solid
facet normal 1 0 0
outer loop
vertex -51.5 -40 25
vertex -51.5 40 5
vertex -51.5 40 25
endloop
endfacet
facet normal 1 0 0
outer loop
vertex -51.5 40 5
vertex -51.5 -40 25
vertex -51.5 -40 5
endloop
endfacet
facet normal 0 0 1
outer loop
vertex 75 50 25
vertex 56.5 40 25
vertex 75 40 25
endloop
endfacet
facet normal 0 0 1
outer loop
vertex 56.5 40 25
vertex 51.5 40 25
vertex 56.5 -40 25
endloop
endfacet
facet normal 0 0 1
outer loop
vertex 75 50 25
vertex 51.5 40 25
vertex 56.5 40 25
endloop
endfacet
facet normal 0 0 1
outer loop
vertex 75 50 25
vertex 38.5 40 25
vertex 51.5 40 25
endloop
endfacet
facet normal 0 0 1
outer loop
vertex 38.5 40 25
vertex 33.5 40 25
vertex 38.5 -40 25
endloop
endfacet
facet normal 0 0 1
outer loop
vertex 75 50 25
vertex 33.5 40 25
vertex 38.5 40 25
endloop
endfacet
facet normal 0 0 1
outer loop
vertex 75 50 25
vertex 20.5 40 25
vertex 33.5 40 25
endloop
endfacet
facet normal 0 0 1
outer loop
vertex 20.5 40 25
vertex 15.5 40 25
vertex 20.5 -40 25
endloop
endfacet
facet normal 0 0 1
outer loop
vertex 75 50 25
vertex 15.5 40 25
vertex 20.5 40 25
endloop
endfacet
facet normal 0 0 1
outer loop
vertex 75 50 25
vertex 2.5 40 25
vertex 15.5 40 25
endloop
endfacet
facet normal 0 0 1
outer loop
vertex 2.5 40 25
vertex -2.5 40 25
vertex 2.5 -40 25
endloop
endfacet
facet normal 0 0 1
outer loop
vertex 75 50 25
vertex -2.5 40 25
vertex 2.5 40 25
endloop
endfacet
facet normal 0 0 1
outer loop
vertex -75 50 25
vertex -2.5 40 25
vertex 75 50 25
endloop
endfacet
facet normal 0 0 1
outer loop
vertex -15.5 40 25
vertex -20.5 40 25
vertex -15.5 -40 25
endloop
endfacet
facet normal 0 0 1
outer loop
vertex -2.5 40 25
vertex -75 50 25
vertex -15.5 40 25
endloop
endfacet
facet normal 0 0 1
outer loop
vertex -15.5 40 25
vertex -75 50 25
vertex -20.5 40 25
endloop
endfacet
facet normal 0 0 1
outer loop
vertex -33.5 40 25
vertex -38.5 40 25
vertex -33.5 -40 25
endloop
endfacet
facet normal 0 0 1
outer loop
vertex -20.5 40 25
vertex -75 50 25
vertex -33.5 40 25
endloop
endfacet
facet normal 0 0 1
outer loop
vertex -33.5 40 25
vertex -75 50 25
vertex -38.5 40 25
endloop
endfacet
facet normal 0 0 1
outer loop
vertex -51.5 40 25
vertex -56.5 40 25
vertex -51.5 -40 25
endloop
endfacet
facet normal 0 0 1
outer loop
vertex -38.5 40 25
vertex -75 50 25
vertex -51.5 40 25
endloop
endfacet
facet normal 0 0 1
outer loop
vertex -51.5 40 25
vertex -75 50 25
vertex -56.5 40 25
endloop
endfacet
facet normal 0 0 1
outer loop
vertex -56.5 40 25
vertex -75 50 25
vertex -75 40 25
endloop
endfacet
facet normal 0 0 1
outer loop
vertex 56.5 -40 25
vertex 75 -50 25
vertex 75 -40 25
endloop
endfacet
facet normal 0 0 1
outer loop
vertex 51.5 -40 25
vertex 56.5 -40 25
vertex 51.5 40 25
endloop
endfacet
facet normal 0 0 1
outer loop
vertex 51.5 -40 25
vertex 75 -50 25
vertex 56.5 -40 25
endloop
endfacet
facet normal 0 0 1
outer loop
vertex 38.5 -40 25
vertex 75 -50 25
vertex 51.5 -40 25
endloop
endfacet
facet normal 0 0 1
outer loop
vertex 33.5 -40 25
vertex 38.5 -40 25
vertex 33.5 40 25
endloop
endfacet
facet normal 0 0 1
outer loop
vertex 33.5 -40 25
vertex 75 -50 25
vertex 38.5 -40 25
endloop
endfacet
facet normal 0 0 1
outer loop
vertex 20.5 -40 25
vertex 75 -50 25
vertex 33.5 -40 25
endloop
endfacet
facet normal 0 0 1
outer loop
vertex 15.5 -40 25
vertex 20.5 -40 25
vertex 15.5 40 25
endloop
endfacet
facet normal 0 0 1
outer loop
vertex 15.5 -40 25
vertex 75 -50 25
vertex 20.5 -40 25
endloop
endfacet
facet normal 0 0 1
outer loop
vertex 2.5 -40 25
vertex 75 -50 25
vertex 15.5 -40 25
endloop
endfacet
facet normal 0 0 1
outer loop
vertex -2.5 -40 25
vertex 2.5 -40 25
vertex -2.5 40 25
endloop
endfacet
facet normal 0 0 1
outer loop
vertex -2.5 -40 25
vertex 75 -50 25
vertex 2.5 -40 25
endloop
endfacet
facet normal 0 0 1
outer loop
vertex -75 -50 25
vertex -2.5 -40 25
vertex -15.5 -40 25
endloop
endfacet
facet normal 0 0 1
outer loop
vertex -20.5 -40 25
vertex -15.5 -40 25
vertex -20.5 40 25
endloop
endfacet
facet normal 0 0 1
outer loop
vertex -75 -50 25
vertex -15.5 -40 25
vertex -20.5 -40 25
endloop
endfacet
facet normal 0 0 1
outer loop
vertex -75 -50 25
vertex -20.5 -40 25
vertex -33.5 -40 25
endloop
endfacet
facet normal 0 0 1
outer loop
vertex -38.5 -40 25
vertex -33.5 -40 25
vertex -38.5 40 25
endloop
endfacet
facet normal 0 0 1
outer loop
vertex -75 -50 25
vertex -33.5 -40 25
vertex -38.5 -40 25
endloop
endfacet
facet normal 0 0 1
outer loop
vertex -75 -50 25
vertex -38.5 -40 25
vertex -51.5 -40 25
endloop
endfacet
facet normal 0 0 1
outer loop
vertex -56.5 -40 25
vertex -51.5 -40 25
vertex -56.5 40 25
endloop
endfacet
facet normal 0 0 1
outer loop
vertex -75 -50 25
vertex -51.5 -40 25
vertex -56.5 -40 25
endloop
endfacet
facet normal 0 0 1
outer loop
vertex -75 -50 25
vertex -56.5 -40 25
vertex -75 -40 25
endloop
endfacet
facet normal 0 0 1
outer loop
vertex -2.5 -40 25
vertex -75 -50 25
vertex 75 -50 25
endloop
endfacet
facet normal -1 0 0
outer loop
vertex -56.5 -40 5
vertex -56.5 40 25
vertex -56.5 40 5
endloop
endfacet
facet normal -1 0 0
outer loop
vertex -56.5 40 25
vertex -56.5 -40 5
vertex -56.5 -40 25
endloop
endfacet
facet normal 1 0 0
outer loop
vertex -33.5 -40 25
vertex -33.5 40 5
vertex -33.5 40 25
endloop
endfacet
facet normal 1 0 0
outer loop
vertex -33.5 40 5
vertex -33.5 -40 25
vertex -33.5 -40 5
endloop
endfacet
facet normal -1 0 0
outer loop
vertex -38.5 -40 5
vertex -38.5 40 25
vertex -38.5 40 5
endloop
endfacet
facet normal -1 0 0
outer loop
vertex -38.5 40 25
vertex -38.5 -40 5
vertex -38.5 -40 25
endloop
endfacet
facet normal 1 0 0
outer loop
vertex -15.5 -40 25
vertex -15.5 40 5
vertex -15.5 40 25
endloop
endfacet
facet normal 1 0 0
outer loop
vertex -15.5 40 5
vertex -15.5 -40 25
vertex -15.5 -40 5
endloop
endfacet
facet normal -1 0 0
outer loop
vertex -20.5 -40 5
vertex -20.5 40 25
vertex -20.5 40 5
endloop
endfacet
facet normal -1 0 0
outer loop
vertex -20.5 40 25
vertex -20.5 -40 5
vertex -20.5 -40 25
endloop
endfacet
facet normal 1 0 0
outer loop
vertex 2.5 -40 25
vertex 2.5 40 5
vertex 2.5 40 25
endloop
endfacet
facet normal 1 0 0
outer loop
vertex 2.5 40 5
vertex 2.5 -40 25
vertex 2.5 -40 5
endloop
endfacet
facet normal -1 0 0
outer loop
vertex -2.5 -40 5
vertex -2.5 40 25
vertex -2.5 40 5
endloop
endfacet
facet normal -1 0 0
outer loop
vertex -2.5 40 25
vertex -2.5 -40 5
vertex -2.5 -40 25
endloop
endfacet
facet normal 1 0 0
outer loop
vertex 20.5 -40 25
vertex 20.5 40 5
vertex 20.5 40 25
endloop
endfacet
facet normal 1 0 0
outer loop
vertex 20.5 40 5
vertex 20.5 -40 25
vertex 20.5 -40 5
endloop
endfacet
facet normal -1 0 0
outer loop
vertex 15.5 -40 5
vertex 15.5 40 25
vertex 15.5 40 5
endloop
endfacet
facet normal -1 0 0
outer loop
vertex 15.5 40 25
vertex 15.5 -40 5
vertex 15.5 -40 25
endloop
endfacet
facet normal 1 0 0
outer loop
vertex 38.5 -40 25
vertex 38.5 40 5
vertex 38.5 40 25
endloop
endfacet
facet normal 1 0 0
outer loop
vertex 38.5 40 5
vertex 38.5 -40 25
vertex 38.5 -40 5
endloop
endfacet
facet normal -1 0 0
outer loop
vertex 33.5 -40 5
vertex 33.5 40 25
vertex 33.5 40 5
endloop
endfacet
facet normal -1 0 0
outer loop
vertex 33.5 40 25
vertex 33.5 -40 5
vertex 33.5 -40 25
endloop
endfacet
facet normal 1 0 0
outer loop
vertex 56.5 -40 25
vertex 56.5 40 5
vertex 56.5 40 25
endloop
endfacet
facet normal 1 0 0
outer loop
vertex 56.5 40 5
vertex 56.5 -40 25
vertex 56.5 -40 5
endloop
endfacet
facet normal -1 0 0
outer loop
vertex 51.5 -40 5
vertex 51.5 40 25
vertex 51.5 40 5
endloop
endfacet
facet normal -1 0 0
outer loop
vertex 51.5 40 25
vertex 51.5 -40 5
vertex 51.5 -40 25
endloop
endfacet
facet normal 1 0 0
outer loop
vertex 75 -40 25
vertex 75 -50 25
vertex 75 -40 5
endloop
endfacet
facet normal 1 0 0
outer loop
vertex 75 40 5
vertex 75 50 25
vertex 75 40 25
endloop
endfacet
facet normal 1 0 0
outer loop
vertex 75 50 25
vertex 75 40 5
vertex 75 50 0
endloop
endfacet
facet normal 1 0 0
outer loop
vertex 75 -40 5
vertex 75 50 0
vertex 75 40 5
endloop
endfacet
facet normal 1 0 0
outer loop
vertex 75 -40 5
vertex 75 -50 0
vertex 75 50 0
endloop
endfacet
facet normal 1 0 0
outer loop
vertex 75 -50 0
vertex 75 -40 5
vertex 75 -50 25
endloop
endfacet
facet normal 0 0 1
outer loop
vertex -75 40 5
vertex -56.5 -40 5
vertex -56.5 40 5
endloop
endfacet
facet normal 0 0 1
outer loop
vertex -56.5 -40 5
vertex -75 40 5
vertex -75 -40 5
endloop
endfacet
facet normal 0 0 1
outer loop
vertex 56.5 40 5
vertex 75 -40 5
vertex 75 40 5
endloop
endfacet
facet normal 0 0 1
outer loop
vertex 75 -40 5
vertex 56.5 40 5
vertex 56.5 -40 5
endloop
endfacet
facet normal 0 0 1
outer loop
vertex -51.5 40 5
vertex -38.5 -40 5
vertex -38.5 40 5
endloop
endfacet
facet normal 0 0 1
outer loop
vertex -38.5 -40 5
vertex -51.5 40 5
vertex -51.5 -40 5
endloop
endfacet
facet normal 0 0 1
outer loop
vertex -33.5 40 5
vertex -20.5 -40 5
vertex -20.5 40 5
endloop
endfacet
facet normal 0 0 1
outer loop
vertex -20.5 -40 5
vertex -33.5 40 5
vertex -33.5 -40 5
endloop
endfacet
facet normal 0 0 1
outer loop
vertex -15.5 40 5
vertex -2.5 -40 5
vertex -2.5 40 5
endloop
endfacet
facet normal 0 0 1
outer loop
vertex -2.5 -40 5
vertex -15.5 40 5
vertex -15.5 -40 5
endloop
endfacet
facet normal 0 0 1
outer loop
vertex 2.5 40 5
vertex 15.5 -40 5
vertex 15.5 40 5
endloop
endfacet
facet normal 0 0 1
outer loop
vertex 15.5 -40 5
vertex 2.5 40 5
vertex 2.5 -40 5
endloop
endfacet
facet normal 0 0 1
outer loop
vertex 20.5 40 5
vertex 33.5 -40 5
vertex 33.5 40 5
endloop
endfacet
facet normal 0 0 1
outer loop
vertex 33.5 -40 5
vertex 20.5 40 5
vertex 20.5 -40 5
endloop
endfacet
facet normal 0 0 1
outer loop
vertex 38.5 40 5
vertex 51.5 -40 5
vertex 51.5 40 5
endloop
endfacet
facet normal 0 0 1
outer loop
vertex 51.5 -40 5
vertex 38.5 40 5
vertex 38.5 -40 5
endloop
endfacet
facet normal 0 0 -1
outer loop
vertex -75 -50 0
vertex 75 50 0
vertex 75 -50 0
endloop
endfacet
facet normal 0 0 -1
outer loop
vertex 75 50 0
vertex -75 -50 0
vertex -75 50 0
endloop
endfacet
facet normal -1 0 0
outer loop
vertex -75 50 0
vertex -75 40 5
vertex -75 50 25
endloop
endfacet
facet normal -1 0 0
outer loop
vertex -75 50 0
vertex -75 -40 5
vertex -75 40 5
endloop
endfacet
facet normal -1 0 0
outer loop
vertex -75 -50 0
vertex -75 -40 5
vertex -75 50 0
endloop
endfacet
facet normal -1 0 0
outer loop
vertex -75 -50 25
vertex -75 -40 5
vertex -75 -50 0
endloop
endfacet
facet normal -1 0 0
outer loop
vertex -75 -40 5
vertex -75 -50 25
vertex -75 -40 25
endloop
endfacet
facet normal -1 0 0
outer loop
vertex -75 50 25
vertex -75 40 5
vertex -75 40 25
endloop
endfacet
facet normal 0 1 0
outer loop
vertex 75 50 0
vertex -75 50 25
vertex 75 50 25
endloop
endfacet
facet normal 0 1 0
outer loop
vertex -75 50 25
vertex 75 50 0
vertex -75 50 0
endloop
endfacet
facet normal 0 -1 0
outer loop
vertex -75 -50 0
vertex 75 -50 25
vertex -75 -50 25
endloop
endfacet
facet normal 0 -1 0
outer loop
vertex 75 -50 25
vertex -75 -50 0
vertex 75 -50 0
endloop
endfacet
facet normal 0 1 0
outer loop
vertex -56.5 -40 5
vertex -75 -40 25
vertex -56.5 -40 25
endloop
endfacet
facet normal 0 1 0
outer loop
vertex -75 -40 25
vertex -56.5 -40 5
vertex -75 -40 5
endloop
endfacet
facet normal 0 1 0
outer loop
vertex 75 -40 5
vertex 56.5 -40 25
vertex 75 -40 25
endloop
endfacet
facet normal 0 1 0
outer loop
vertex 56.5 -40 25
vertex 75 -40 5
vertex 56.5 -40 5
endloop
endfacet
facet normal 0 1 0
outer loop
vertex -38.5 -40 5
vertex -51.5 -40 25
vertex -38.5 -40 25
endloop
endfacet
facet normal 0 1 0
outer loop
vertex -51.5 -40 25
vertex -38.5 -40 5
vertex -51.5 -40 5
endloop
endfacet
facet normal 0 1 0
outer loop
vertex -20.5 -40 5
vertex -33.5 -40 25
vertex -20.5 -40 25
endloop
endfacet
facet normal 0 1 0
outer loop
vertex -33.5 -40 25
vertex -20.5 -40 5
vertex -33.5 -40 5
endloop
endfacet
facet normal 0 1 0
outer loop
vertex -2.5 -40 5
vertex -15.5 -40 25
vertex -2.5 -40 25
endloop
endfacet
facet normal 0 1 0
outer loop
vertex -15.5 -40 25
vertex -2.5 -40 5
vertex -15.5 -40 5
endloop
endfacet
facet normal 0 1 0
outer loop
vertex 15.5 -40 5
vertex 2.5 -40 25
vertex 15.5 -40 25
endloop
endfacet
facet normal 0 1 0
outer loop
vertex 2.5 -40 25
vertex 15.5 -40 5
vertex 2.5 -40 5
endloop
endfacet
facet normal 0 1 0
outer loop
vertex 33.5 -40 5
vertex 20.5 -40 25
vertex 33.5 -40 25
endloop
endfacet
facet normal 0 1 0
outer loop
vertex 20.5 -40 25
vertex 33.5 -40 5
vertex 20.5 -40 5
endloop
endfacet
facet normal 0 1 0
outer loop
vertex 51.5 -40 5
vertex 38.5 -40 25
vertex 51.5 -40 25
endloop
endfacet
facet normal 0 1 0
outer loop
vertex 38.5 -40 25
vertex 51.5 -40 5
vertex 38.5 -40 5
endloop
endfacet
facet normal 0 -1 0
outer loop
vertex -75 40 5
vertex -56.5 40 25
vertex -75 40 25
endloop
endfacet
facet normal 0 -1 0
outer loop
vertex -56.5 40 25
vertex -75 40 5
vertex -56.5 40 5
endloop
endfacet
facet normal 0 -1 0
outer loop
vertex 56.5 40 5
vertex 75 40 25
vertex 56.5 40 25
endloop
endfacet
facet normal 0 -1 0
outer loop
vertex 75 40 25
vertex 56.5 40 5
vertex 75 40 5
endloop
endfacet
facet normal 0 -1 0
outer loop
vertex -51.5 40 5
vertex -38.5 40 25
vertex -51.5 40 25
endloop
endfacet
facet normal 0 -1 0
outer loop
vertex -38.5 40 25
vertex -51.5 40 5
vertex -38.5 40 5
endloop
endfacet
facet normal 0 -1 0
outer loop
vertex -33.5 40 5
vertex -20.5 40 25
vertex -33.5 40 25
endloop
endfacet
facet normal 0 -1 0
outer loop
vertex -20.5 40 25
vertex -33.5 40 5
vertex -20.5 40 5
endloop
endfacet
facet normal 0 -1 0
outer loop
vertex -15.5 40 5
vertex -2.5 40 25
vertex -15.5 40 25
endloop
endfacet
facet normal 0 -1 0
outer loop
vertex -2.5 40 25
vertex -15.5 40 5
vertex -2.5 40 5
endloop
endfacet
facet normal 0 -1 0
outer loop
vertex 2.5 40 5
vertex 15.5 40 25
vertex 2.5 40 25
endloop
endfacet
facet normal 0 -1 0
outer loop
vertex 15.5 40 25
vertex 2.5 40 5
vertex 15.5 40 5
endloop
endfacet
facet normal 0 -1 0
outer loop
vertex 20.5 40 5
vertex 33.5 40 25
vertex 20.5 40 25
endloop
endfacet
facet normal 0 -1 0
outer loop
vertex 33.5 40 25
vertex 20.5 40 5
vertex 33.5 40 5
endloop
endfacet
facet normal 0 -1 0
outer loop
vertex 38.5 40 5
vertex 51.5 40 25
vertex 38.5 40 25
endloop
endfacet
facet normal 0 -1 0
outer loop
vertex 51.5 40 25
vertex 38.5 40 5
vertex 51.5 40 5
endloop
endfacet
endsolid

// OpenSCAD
$fn = 32;

// ----------------------------------------------------------------------
// Rib frame 150 x 100 x 25
// 7 ribs at 18 mm pitch
// ----------------------------------------------------------------------

// --- parameters (mm) ---
frame = [150, 100, 5];  // base plate size (x, y, z)
rail_w = 10;            // side rail width
ribs = 7;               // number of ribs
rib_t = 5;              // rib thickness
rib_h = 20;             // rib height above the base plate
pitch = 18;             // pitch between rib centres

// --- derived feature positions (mm) ---
span = (ribs - 1) * pitch;          // = 108   distance between the outer ribs
origin_x = -span / 2;               // = -54   X of the first rib
rib_len = frame[1] - 2 * rail_w + 2;  // = 82   rib length, 1 mm into each rail
feature_centers = [
  [origin_x + 0 * pitch, 0],
  [origin_x + 1 * pitch, 0],
  [origin_x + 2 * pitch, 0],
  [origin_x + 3 * pitch, 0],
  [origin_x + 4 * pitch, 0],
  [origin_x + 5 * pitch, 0],
  [origin_x + 6 * pitch, 0]
];   // rib centre line, drives the rib loop

// base plate, two side rails, then the ribs read straight off feature_centers
union() {
  translate([-frame[0] / 2, -frame[1] / 2, 0]) cube(frame);
  translate([-frame[0] / 2, -frame[1] / 2, 0]) cube([frame[0], rail_w, frame[2] + rib_h]);
  translate([-frame[0] / 2, frame[1] / 2 - rail_w, 0]) cube([frame[0], rail_w, frame[2] + rib_h]);
  for (centre = feature_centers)
    translate([centre[0] - rib_t / 2, centre[1] - rib_len / 2, frame[2] - 1])
      cube([rib_t, rib_len, rib_h + 1]);
}
